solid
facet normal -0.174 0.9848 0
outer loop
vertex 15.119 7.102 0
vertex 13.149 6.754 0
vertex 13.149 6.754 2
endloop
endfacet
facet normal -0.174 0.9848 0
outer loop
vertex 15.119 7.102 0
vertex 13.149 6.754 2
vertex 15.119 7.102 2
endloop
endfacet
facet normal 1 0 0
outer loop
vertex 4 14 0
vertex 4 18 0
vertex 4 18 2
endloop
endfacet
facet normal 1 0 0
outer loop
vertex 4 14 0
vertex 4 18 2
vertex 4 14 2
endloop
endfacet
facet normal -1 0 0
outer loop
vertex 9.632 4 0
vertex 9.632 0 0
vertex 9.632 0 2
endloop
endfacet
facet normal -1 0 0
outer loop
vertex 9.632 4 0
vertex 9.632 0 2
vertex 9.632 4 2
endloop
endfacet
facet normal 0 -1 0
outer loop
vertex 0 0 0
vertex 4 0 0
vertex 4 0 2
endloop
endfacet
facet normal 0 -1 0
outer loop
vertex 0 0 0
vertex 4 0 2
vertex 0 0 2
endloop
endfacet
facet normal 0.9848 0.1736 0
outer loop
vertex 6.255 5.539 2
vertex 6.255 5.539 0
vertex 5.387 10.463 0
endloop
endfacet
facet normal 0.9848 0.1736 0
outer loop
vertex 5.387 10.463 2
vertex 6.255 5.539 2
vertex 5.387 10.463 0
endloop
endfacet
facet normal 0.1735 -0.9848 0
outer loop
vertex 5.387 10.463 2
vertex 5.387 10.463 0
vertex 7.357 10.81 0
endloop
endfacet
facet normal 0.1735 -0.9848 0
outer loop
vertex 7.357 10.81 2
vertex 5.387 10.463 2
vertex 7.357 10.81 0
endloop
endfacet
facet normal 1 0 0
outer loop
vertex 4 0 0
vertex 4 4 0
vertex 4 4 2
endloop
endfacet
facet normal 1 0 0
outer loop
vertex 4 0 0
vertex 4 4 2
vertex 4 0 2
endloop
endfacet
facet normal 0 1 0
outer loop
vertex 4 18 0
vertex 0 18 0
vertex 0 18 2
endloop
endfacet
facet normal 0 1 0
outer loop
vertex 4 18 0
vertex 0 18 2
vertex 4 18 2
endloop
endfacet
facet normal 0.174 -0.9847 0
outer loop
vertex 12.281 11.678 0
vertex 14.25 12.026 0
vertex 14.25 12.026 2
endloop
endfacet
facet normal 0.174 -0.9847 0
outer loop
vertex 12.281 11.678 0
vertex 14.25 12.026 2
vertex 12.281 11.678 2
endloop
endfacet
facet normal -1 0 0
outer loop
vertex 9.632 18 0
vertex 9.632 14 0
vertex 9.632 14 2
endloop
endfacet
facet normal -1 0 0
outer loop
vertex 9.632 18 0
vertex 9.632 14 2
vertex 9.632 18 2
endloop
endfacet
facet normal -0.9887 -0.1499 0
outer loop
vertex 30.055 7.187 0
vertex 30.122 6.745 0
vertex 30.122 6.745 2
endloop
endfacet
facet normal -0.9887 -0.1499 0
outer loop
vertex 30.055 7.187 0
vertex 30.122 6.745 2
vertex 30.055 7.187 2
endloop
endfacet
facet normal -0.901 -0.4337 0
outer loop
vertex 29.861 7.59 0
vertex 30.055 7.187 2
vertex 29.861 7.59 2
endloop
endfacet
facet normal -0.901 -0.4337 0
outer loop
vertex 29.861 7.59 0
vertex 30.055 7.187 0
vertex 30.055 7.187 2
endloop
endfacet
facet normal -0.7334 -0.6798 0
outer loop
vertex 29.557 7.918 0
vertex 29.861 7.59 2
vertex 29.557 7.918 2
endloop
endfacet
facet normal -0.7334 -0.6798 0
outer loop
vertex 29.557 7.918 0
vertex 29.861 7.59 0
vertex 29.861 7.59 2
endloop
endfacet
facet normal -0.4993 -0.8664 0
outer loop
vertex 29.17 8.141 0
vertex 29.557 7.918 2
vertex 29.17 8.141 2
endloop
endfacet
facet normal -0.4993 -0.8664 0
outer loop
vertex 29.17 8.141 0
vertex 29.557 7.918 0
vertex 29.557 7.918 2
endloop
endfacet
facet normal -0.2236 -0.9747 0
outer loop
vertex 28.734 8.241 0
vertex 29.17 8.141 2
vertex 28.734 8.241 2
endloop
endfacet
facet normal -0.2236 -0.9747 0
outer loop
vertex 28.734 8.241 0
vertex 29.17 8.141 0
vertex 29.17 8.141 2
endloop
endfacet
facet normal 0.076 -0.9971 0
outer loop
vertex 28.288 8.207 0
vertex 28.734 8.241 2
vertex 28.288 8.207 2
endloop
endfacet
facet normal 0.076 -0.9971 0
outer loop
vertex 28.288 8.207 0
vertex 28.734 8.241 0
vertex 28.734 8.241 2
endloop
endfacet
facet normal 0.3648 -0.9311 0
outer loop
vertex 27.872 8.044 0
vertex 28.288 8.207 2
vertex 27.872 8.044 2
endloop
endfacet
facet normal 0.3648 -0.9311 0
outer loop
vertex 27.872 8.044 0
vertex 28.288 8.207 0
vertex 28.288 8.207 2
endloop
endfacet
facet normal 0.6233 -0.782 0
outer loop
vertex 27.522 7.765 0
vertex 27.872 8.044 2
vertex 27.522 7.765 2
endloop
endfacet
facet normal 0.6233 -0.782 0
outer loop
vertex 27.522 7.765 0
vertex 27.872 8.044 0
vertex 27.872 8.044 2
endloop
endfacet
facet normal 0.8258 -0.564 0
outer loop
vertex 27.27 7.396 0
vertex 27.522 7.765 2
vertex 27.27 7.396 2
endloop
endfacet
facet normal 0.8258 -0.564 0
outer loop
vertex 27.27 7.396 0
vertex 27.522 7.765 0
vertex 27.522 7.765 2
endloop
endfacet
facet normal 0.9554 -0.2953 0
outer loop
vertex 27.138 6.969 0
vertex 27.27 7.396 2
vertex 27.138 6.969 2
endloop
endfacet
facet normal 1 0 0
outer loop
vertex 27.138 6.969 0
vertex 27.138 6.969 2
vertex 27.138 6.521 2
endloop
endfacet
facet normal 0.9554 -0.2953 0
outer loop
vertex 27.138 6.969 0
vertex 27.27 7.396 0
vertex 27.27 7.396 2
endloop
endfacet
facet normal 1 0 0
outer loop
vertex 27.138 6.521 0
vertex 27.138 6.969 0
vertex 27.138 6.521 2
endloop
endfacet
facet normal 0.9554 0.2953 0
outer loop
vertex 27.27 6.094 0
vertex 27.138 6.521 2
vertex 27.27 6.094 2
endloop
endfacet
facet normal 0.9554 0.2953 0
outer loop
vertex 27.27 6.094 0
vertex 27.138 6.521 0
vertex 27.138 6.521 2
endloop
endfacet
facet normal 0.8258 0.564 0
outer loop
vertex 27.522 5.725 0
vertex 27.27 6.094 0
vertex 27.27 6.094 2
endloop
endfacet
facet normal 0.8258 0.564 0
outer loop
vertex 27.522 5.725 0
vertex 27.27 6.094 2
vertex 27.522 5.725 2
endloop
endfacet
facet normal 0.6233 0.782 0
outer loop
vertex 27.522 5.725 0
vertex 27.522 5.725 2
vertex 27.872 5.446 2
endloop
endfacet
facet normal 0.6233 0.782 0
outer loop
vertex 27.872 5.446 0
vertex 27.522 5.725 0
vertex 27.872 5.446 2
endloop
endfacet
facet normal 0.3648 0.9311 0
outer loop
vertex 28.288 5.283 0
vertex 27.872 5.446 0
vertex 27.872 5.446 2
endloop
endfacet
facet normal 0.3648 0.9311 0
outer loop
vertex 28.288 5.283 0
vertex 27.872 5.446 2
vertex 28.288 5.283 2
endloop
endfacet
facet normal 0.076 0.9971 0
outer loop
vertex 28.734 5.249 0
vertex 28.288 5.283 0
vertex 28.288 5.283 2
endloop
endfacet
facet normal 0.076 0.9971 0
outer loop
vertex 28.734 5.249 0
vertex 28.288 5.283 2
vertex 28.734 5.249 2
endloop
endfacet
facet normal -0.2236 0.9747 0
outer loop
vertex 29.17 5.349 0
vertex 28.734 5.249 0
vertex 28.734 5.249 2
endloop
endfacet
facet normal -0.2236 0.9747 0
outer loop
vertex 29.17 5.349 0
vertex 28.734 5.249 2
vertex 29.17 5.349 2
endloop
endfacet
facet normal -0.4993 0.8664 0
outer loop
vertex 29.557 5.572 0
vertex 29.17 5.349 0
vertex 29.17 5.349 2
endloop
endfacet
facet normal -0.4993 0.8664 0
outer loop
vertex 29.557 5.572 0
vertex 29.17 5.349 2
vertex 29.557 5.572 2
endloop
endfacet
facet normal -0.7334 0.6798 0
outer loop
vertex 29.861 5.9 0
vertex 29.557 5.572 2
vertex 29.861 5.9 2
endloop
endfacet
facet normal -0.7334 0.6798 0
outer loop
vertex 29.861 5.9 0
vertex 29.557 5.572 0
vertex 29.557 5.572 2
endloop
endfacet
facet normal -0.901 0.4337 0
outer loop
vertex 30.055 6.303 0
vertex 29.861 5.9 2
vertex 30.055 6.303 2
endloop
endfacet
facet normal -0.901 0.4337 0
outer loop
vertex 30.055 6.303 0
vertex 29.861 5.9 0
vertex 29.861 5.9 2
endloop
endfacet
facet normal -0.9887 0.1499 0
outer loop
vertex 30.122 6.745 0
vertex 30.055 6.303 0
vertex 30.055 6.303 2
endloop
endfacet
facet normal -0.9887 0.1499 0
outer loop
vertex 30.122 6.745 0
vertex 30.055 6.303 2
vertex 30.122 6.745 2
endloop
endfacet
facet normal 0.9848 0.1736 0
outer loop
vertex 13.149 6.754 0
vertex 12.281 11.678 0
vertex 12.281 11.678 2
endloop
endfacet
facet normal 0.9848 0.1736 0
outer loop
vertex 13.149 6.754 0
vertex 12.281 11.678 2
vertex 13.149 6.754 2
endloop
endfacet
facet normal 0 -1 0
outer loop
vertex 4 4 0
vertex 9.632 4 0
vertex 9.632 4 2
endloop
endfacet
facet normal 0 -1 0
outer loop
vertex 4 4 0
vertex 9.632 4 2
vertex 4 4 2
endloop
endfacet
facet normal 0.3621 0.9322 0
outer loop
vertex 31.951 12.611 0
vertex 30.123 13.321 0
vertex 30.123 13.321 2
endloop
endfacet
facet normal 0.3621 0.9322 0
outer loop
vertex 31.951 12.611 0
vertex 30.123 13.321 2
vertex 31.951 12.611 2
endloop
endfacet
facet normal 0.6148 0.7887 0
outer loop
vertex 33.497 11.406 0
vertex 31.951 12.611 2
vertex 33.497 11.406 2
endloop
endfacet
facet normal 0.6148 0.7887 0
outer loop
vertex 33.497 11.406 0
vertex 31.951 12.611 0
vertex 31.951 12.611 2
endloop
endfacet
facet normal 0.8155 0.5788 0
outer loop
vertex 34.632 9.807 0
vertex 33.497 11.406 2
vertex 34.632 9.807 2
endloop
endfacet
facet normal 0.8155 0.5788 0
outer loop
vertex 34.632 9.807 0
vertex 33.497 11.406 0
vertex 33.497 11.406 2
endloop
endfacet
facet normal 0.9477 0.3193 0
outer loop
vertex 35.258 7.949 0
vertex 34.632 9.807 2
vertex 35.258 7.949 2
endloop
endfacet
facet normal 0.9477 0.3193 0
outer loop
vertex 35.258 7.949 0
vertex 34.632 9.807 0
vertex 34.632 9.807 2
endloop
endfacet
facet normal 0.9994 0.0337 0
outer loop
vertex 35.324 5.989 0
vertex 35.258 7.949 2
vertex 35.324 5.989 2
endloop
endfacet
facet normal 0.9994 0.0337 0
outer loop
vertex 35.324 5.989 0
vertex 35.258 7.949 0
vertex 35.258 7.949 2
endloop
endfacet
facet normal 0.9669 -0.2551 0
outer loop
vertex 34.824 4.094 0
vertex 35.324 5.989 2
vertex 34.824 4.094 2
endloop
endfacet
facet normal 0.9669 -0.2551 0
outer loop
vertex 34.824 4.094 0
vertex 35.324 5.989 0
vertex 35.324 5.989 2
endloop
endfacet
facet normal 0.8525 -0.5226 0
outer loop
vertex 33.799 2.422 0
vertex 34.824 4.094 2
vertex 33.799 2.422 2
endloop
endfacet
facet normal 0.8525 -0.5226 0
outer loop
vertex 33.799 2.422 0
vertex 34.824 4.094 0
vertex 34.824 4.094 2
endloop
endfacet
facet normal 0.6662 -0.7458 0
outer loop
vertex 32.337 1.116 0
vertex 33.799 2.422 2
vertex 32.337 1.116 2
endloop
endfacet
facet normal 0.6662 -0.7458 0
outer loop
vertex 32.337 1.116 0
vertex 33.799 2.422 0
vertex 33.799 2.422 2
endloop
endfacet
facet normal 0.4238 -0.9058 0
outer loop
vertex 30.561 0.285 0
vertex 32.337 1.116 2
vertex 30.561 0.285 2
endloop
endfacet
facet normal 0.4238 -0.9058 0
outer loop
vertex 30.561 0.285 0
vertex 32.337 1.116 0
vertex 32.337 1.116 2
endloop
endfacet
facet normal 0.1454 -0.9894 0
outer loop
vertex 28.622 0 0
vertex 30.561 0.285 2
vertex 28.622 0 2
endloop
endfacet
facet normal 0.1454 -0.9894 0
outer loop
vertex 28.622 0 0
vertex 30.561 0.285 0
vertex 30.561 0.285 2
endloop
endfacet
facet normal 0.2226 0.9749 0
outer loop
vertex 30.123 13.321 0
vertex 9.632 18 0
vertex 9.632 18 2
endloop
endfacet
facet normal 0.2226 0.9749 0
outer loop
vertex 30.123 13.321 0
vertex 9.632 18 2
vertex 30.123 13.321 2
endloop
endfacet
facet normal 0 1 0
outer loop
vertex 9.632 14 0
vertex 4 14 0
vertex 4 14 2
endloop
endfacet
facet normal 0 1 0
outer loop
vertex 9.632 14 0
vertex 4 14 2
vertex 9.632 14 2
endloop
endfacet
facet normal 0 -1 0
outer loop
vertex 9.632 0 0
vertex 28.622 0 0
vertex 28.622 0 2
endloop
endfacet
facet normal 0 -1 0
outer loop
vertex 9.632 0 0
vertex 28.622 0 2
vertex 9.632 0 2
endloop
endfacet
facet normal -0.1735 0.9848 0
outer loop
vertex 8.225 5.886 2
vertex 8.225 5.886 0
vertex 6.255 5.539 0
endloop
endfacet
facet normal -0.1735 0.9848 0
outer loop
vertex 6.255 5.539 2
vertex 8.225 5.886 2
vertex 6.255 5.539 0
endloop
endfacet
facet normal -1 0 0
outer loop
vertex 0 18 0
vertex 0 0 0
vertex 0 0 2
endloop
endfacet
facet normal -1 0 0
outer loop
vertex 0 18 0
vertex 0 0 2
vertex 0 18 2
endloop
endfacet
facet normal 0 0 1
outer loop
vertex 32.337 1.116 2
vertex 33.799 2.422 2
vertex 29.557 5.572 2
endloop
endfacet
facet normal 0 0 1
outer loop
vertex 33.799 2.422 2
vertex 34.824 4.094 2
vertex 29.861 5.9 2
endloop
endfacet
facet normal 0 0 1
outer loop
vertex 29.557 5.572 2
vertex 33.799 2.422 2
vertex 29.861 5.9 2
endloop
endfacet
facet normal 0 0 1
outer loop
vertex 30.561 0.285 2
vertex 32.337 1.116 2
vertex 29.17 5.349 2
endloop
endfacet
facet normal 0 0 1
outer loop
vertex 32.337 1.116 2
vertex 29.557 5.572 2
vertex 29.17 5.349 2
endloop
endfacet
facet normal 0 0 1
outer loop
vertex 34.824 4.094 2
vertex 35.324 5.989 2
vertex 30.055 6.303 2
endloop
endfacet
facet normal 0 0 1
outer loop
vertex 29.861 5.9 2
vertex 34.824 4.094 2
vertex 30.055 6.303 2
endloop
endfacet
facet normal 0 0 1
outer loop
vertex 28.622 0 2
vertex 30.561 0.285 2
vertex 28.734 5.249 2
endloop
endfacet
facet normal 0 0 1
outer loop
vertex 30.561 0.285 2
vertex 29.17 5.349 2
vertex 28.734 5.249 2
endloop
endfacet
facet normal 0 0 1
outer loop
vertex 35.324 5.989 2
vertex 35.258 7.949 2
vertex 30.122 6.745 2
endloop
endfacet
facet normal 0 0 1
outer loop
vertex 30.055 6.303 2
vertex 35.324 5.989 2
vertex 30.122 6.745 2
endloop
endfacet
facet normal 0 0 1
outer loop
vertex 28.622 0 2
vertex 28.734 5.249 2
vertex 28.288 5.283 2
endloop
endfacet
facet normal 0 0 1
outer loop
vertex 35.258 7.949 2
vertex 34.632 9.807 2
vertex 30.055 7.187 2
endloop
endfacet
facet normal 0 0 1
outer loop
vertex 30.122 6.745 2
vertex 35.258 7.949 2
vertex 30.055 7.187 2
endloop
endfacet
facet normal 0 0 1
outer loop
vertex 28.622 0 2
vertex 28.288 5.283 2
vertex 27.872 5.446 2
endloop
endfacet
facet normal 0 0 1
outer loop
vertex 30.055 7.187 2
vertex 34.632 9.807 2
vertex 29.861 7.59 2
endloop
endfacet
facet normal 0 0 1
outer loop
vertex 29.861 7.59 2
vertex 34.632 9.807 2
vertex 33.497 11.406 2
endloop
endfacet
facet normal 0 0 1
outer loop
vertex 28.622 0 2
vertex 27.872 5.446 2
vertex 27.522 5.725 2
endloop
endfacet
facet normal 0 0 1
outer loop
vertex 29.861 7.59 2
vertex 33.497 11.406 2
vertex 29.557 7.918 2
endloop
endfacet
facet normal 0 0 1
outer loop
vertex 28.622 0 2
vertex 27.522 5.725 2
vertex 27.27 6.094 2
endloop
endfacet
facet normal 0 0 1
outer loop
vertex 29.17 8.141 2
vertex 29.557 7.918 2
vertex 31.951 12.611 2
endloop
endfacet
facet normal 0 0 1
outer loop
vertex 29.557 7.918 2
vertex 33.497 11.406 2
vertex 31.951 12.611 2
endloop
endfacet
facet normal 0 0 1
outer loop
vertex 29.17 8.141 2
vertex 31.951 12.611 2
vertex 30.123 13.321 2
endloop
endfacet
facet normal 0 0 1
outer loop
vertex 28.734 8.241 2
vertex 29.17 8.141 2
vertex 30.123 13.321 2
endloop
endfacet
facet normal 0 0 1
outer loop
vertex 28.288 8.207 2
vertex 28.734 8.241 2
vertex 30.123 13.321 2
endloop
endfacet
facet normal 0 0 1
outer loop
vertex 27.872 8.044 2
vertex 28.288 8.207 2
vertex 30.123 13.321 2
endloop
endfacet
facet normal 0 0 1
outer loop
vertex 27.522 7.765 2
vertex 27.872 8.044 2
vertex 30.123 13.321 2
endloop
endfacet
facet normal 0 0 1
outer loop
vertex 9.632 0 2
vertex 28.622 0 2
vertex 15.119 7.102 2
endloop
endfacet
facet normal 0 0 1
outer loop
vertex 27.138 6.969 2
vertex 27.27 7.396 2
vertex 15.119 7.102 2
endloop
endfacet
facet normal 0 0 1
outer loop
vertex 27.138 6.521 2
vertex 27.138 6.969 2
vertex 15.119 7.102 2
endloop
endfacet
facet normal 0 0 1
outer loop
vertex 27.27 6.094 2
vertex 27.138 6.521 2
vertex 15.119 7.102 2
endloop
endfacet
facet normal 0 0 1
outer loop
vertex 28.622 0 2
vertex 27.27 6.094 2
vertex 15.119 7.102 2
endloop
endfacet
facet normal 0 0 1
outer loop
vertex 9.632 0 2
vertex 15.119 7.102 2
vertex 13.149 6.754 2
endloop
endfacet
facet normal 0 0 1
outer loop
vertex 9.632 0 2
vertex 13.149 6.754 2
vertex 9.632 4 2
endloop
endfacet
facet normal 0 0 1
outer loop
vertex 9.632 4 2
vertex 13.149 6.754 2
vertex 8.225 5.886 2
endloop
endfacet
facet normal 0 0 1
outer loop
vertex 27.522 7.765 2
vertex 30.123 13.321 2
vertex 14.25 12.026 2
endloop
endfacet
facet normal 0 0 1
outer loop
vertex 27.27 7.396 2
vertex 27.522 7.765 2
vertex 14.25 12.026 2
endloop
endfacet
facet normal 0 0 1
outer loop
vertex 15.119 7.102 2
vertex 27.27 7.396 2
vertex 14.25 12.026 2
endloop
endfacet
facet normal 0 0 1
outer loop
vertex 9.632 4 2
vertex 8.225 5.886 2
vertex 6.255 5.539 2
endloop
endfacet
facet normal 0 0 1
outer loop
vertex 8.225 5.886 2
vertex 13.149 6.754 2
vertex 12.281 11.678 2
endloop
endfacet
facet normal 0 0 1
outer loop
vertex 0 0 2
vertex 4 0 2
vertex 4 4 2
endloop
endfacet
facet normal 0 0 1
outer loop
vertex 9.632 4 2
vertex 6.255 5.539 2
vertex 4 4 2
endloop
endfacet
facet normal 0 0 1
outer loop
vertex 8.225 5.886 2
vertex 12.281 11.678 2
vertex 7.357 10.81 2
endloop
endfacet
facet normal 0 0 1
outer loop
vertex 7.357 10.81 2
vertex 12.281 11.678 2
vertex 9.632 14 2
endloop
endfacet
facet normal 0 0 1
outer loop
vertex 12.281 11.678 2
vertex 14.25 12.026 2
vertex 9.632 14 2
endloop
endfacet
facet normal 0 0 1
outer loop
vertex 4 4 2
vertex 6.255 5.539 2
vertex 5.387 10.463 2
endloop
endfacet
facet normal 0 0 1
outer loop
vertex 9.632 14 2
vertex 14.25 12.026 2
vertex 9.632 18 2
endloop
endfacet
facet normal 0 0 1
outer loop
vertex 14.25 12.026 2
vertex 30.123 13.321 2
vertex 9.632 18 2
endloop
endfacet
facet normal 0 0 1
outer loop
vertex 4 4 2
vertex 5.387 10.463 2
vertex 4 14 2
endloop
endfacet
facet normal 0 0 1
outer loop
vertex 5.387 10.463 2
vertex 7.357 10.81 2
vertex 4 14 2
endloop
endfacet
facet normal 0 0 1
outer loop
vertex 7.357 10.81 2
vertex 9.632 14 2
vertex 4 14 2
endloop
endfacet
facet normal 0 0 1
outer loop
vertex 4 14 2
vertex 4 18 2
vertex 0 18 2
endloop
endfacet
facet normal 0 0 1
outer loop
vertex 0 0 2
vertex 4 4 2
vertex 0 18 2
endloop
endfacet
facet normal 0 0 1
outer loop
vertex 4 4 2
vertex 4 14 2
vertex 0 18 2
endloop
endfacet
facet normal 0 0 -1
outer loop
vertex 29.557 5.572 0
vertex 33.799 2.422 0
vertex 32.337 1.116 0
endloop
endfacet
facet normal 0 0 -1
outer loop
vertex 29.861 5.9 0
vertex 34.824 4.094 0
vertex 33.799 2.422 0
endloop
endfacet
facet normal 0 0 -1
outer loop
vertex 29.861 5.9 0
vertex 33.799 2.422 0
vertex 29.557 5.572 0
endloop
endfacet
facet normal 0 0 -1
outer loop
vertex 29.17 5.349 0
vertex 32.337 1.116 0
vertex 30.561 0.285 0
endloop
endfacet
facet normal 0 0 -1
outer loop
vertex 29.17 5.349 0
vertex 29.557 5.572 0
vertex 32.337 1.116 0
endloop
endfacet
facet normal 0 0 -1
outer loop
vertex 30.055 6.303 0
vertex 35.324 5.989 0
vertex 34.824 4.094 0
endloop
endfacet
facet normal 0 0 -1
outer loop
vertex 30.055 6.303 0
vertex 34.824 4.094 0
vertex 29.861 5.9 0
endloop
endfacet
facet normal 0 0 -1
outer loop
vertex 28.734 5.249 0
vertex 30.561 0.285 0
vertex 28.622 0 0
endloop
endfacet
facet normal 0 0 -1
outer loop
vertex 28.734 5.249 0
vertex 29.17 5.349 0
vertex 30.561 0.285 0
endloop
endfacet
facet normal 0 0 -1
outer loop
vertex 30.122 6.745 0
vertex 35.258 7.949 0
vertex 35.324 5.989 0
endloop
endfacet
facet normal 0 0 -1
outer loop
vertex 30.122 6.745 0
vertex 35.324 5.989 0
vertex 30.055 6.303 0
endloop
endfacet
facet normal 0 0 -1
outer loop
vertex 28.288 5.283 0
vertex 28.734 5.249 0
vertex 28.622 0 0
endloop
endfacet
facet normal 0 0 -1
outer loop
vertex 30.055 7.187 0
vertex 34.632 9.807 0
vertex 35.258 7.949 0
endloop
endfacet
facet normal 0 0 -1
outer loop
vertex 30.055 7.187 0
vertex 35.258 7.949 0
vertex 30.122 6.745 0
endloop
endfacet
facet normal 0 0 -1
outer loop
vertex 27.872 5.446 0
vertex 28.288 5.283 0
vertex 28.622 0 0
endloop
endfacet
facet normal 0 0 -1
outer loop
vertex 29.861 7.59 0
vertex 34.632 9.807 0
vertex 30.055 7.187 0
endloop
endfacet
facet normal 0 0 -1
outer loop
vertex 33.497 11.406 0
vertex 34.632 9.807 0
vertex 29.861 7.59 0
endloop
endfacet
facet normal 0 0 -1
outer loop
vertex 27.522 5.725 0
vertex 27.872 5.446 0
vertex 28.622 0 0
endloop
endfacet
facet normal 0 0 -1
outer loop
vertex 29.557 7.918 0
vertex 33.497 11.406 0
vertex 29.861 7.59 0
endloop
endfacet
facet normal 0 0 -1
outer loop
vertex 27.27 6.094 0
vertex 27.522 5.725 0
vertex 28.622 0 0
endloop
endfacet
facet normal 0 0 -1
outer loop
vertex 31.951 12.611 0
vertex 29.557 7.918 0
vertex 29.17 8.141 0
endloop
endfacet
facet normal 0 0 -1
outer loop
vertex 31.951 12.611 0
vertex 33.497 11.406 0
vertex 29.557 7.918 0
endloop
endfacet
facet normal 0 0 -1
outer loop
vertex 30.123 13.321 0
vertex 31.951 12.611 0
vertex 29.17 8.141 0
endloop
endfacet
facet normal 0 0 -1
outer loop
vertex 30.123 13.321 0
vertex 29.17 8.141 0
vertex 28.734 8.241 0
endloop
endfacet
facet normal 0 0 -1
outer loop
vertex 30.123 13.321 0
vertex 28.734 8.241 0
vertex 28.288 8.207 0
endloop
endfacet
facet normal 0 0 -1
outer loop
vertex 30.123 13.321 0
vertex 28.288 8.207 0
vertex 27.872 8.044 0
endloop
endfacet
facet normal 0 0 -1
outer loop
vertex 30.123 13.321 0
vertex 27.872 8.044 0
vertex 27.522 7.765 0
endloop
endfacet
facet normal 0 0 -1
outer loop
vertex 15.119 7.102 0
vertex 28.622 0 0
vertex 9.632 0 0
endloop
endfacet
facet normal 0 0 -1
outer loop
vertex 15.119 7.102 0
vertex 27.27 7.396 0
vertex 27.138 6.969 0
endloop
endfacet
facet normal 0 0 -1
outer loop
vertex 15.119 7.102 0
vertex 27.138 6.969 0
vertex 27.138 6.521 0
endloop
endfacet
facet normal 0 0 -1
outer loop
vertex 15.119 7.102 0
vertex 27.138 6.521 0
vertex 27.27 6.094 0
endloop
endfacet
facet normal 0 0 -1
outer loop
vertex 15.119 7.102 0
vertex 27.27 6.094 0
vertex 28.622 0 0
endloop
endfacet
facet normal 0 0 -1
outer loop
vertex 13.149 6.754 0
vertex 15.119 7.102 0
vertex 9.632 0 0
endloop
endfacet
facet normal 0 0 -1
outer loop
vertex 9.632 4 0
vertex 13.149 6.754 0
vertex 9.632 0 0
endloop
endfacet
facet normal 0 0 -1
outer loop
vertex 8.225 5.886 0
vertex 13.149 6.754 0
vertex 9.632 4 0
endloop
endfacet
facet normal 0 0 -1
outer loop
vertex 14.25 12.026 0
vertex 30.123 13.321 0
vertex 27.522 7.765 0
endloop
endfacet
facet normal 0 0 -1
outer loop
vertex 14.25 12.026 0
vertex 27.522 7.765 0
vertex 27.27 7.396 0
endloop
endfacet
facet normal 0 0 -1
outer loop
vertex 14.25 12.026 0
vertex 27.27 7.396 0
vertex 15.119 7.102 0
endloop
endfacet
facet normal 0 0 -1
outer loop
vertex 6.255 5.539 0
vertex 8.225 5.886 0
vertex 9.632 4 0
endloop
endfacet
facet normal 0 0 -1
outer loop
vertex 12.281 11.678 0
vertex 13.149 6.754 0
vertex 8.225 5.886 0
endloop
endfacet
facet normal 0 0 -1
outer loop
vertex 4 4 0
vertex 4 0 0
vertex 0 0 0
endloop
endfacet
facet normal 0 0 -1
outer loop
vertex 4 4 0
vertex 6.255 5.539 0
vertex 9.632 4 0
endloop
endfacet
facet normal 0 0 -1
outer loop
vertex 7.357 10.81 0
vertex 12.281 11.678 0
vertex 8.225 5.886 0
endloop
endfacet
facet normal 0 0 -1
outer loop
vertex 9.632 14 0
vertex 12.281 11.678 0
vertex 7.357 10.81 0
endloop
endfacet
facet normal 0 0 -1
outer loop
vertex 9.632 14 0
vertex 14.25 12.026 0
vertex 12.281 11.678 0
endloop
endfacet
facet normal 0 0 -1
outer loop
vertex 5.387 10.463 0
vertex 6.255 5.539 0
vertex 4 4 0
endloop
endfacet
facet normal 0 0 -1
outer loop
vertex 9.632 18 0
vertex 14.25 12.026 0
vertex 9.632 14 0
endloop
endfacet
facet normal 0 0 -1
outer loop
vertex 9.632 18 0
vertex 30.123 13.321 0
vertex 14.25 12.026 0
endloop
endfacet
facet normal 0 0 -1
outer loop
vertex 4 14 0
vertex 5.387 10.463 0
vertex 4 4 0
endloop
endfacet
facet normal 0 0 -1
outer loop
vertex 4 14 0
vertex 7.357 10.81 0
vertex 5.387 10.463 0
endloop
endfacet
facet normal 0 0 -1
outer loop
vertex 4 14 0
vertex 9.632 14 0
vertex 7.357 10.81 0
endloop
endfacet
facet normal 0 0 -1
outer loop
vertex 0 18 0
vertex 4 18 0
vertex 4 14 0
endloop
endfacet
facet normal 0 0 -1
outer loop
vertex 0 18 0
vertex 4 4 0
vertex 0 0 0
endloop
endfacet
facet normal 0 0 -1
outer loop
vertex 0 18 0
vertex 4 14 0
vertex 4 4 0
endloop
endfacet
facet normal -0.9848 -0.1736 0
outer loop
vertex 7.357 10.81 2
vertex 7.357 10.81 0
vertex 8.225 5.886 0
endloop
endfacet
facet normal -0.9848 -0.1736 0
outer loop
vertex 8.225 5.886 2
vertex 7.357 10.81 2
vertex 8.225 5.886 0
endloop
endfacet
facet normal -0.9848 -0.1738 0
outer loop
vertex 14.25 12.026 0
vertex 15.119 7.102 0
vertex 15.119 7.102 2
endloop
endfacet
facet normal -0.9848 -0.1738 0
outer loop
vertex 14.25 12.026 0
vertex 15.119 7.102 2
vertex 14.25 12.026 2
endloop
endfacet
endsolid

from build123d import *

# Parameters (mm, degrees)
SKETCH1_R           = 1.5
BOSS_EXTRUDE1_DEPTH = 2


with BuildPart() as part:
    # Sketch1 → Boss-Extrude1 (new body)
    with BuildSketch(Plane.XY):
        with BuildLine():
            Line((0, 0), (0, 18.000341084))
            Line((0, 18.000341084), (4, 18.000341084))
            Line((4, 18.000341084), (4, 14.000341084))
            Line((4, 14.000341084), (9.631516349, 14.000341084))
            Line((9.631516349, 14.000341084), (9.631516349, 18.000341084))
            Line((9.631516349, 18.000341084), (30.123176491, 13.320805491))
            ThreePointArc((30.123176491, 13.320805491), (35.324106187, 5.989458303), (28.621516349, 0))
            Line((28.621516349, 0), (9.631516349, 0))
            Line((9.631516349, 0), (9.631516349, 4))
            Line((9.631516349, 4), (4, 4))
            Line((4, 4), (4, 0))
            Line((4, 0), (0, 0))
        make_face()
        with Locations((28.621516349, 6.745044143)):
            Circle(SKETCH1_R, mode=Mode.SUBTRACT)
        Polygon((14.250450019, 12.02557168), (12.280834513, 11.678275325), (13.149075402, 6.75423656), (15.118690908, 7.101532915), align=None, mode=Mode.SUBTRACT)
        Polygon((7.356795748, 10.810034437), (8.225036637, 5.885995672), (6.255421131, 5.538699316), (5.387180242, 10.462738081), align=None, mode=Mode.SUBTRACT)
    extrude(amount=BOSS_EXTRUDE1_DEPTH)


solid = part.part
